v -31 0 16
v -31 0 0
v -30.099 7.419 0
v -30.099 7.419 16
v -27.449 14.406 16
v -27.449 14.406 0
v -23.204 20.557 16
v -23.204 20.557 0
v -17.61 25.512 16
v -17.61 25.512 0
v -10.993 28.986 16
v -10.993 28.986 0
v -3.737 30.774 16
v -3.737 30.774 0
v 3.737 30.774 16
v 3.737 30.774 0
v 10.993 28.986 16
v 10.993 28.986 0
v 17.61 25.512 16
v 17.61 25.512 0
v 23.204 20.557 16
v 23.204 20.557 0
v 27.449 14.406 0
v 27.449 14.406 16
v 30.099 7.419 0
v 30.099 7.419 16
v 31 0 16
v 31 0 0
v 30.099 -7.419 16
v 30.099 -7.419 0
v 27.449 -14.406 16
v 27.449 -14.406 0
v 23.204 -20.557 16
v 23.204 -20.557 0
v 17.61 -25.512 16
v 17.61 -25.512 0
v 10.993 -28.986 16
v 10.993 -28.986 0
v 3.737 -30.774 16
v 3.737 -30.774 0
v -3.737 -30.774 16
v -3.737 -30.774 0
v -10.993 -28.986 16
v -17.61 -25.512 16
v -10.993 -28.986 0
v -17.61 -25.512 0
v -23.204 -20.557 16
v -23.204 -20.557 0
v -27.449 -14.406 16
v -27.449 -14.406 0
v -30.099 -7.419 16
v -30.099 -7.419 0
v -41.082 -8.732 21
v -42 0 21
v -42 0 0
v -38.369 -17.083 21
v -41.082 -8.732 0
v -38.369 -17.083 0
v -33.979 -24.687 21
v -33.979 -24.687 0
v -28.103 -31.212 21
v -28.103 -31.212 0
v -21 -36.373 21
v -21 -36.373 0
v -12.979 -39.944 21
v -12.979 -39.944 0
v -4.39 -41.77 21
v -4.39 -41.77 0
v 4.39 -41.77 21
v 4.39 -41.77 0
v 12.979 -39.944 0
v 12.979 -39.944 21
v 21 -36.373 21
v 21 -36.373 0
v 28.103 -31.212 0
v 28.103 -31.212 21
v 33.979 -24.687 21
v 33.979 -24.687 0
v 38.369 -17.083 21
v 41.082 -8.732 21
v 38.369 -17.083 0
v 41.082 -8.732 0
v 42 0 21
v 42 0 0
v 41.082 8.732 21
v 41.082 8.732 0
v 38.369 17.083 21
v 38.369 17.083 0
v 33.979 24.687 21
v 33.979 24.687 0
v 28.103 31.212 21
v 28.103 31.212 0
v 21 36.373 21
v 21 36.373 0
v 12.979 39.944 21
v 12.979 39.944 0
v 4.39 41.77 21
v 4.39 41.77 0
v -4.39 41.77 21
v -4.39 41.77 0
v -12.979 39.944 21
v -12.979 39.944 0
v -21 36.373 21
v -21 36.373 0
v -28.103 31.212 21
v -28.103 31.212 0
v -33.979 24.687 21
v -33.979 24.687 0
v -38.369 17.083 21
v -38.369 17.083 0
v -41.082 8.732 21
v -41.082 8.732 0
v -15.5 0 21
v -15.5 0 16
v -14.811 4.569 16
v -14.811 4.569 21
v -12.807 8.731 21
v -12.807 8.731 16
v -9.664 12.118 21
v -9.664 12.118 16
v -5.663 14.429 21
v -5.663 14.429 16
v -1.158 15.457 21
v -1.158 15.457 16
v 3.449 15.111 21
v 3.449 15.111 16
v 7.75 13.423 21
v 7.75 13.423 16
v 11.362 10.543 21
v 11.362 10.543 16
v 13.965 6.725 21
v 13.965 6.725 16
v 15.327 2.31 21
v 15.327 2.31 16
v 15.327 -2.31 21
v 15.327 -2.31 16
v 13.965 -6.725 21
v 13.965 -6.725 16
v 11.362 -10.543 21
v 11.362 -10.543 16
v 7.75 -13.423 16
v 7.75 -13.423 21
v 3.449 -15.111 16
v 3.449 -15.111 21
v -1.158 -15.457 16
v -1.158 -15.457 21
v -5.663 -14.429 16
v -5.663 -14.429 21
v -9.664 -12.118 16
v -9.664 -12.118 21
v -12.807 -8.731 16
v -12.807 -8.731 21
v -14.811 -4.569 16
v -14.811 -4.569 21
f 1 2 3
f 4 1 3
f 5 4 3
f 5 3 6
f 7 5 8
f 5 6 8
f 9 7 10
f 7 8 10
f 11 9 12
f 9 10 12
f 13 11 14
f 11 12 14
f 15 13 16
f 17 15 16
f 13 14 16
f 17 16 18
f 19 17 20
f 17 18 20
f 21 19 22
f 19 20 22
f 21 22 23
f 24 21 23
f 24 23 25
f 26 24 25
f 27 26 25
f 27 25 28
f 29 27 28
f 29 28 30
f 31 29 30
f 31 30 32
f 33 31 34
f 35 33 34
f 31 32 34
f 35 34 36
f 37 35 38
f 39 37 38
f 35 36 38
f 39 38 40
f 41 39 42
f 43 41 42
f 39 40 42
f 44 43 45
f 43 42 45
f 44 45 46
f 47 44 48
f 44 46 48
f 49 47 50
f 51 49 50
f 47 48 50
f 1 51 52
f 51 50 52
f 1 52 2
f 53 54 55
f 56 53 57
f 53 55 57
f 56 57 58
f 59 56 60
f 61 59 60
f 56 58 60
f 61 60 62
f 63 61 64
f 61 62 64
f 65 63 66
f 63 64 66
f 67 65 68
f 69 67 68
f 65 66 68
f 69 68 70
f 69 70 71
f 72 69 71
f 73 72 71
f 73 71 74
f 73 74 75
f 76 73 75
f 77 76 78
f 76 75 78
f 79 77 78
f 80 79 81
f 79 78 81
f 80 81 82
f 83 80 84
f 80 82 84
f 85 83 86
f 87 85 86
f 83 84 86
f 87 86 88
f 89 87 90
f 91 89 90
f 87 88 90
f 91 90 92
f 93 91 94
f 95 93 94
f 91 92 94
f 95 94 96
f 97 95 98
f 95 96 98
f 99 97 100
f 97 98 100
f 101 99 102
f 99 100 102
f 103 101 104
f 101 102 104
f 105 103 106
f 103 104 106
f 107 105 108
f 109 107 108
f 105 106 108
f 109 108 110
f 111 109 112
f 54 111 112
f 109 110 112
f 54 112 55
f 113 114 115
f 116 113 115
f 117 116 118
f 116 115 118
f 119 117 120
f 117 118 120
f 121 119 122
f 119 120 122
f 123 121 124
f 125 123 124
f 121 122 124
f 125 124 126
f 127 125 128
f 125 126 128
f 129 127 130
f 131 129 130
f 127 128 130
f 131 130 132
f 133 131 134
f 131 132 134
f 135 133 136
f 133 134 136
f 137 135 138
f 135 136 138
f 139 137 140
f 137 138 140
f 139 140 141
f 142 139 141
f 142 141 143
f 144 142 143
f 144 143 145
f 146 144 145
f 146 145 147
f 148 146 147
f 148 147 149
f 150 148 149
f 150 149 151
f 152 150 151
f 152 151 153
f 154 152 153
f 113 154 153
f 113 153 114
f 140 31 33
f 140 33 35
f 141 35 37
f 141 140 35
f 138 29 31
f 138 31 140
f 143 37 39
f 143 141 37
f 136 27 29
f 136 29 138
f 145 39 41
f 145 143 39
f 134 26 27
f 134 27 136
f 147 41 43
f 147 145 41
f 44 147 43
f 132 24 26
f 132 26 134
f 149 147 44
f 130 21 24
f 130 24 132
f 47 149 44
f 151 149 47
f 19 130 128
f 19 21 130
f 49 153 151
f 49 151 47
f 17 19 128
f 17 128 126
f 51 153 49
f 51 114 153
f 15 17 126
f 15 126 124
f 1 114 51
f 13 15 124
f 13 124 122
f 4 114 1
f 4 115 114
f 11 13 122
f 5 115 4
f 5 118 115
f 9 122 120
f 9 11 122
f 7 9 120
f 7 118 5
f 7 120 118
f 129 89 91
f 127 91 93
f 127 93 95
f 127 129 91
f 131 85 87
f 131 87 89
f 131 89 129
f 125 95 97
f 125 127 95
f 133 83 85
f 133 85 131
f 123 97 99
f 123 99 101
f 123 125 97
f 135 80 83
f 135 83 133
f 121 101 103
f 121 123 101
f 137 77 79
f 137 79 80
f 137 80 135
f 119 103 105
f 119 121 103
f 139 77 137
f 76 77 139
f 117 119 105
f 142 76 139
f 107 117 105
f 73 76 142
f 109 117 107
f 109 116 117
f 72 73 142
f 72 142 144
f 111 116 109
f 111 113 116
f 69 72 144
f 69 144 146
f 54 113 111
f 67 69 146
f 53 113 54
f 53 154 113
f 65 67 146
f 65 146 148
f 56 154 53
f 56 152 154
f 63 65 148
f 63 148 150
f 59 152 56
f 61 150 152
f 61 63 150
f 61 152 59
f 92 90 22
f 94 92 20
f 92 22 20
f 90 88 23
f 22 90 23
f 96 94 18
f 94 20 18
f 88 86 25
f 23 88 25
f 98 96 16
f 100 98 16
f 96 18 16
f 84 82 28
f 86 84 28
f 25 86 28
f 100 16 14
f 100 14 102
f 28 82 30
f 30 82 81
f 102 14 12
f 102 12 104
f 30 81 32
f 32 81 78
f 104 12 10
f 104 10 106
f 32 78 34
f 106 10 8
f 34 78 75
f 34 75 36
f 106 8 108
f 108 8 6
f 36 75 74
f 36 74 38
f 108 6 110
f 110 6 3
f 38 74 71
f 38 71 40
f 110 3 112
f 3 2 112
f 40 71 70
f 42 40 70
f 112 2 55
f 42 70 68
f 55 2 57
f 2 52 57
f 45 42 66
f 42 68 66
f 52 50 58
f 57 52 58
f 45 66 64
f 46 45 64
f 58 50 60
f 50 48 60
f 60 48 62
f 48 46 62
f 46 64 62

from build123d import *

# Parameters (mm, degrees)
SKETCH_1_R          = 42
EXTRUDE_1_DEPTH     = 21
SKETCH_2_R          = 31
CUT_EXTRUDE_2_DEPTH = 16
SKETCH_3_R          = 15.5
CUT_EXTRUDE_3_DEPTH = 62.514225997


with BuildPart() as part:
    # Эскиз1 → Вытянуть1 (new body)
    with BuildSketch(Plane.XY):
        with Locations(Location((0, 0, 0), (0, 0, 180))):
            Circle(SKETCH_1_R)
    extrude(amount=EXTRUDE_1_DEPTH)

    # Эскиз2 → Вытянуть2 (cut)
    with BuildSketch(Plane(origin=(0, 0, 0), x_dir=(-1, 0, 0), z_dir=(0, 0, -1))):
        Circle(SKETCH_2_R)
    extrude(amount=-CUT_EXTRUDE_2_DEPTH, mode=Mode.SUBTRACT)

    # Эскиз3 → Вытянуть3 (cut, through all)
    with BuildSketch(Plane(origin=(0, 0, 16), x_dir=(-1, 0, 0), z_dir=(0, 0, -1))):
        Circle(SKETCH_3_R)
    extrude(amount=-CUT_EXTRUDE_3_DEPTH, mode=Mode.SUBTRACT)


solid = part.part
